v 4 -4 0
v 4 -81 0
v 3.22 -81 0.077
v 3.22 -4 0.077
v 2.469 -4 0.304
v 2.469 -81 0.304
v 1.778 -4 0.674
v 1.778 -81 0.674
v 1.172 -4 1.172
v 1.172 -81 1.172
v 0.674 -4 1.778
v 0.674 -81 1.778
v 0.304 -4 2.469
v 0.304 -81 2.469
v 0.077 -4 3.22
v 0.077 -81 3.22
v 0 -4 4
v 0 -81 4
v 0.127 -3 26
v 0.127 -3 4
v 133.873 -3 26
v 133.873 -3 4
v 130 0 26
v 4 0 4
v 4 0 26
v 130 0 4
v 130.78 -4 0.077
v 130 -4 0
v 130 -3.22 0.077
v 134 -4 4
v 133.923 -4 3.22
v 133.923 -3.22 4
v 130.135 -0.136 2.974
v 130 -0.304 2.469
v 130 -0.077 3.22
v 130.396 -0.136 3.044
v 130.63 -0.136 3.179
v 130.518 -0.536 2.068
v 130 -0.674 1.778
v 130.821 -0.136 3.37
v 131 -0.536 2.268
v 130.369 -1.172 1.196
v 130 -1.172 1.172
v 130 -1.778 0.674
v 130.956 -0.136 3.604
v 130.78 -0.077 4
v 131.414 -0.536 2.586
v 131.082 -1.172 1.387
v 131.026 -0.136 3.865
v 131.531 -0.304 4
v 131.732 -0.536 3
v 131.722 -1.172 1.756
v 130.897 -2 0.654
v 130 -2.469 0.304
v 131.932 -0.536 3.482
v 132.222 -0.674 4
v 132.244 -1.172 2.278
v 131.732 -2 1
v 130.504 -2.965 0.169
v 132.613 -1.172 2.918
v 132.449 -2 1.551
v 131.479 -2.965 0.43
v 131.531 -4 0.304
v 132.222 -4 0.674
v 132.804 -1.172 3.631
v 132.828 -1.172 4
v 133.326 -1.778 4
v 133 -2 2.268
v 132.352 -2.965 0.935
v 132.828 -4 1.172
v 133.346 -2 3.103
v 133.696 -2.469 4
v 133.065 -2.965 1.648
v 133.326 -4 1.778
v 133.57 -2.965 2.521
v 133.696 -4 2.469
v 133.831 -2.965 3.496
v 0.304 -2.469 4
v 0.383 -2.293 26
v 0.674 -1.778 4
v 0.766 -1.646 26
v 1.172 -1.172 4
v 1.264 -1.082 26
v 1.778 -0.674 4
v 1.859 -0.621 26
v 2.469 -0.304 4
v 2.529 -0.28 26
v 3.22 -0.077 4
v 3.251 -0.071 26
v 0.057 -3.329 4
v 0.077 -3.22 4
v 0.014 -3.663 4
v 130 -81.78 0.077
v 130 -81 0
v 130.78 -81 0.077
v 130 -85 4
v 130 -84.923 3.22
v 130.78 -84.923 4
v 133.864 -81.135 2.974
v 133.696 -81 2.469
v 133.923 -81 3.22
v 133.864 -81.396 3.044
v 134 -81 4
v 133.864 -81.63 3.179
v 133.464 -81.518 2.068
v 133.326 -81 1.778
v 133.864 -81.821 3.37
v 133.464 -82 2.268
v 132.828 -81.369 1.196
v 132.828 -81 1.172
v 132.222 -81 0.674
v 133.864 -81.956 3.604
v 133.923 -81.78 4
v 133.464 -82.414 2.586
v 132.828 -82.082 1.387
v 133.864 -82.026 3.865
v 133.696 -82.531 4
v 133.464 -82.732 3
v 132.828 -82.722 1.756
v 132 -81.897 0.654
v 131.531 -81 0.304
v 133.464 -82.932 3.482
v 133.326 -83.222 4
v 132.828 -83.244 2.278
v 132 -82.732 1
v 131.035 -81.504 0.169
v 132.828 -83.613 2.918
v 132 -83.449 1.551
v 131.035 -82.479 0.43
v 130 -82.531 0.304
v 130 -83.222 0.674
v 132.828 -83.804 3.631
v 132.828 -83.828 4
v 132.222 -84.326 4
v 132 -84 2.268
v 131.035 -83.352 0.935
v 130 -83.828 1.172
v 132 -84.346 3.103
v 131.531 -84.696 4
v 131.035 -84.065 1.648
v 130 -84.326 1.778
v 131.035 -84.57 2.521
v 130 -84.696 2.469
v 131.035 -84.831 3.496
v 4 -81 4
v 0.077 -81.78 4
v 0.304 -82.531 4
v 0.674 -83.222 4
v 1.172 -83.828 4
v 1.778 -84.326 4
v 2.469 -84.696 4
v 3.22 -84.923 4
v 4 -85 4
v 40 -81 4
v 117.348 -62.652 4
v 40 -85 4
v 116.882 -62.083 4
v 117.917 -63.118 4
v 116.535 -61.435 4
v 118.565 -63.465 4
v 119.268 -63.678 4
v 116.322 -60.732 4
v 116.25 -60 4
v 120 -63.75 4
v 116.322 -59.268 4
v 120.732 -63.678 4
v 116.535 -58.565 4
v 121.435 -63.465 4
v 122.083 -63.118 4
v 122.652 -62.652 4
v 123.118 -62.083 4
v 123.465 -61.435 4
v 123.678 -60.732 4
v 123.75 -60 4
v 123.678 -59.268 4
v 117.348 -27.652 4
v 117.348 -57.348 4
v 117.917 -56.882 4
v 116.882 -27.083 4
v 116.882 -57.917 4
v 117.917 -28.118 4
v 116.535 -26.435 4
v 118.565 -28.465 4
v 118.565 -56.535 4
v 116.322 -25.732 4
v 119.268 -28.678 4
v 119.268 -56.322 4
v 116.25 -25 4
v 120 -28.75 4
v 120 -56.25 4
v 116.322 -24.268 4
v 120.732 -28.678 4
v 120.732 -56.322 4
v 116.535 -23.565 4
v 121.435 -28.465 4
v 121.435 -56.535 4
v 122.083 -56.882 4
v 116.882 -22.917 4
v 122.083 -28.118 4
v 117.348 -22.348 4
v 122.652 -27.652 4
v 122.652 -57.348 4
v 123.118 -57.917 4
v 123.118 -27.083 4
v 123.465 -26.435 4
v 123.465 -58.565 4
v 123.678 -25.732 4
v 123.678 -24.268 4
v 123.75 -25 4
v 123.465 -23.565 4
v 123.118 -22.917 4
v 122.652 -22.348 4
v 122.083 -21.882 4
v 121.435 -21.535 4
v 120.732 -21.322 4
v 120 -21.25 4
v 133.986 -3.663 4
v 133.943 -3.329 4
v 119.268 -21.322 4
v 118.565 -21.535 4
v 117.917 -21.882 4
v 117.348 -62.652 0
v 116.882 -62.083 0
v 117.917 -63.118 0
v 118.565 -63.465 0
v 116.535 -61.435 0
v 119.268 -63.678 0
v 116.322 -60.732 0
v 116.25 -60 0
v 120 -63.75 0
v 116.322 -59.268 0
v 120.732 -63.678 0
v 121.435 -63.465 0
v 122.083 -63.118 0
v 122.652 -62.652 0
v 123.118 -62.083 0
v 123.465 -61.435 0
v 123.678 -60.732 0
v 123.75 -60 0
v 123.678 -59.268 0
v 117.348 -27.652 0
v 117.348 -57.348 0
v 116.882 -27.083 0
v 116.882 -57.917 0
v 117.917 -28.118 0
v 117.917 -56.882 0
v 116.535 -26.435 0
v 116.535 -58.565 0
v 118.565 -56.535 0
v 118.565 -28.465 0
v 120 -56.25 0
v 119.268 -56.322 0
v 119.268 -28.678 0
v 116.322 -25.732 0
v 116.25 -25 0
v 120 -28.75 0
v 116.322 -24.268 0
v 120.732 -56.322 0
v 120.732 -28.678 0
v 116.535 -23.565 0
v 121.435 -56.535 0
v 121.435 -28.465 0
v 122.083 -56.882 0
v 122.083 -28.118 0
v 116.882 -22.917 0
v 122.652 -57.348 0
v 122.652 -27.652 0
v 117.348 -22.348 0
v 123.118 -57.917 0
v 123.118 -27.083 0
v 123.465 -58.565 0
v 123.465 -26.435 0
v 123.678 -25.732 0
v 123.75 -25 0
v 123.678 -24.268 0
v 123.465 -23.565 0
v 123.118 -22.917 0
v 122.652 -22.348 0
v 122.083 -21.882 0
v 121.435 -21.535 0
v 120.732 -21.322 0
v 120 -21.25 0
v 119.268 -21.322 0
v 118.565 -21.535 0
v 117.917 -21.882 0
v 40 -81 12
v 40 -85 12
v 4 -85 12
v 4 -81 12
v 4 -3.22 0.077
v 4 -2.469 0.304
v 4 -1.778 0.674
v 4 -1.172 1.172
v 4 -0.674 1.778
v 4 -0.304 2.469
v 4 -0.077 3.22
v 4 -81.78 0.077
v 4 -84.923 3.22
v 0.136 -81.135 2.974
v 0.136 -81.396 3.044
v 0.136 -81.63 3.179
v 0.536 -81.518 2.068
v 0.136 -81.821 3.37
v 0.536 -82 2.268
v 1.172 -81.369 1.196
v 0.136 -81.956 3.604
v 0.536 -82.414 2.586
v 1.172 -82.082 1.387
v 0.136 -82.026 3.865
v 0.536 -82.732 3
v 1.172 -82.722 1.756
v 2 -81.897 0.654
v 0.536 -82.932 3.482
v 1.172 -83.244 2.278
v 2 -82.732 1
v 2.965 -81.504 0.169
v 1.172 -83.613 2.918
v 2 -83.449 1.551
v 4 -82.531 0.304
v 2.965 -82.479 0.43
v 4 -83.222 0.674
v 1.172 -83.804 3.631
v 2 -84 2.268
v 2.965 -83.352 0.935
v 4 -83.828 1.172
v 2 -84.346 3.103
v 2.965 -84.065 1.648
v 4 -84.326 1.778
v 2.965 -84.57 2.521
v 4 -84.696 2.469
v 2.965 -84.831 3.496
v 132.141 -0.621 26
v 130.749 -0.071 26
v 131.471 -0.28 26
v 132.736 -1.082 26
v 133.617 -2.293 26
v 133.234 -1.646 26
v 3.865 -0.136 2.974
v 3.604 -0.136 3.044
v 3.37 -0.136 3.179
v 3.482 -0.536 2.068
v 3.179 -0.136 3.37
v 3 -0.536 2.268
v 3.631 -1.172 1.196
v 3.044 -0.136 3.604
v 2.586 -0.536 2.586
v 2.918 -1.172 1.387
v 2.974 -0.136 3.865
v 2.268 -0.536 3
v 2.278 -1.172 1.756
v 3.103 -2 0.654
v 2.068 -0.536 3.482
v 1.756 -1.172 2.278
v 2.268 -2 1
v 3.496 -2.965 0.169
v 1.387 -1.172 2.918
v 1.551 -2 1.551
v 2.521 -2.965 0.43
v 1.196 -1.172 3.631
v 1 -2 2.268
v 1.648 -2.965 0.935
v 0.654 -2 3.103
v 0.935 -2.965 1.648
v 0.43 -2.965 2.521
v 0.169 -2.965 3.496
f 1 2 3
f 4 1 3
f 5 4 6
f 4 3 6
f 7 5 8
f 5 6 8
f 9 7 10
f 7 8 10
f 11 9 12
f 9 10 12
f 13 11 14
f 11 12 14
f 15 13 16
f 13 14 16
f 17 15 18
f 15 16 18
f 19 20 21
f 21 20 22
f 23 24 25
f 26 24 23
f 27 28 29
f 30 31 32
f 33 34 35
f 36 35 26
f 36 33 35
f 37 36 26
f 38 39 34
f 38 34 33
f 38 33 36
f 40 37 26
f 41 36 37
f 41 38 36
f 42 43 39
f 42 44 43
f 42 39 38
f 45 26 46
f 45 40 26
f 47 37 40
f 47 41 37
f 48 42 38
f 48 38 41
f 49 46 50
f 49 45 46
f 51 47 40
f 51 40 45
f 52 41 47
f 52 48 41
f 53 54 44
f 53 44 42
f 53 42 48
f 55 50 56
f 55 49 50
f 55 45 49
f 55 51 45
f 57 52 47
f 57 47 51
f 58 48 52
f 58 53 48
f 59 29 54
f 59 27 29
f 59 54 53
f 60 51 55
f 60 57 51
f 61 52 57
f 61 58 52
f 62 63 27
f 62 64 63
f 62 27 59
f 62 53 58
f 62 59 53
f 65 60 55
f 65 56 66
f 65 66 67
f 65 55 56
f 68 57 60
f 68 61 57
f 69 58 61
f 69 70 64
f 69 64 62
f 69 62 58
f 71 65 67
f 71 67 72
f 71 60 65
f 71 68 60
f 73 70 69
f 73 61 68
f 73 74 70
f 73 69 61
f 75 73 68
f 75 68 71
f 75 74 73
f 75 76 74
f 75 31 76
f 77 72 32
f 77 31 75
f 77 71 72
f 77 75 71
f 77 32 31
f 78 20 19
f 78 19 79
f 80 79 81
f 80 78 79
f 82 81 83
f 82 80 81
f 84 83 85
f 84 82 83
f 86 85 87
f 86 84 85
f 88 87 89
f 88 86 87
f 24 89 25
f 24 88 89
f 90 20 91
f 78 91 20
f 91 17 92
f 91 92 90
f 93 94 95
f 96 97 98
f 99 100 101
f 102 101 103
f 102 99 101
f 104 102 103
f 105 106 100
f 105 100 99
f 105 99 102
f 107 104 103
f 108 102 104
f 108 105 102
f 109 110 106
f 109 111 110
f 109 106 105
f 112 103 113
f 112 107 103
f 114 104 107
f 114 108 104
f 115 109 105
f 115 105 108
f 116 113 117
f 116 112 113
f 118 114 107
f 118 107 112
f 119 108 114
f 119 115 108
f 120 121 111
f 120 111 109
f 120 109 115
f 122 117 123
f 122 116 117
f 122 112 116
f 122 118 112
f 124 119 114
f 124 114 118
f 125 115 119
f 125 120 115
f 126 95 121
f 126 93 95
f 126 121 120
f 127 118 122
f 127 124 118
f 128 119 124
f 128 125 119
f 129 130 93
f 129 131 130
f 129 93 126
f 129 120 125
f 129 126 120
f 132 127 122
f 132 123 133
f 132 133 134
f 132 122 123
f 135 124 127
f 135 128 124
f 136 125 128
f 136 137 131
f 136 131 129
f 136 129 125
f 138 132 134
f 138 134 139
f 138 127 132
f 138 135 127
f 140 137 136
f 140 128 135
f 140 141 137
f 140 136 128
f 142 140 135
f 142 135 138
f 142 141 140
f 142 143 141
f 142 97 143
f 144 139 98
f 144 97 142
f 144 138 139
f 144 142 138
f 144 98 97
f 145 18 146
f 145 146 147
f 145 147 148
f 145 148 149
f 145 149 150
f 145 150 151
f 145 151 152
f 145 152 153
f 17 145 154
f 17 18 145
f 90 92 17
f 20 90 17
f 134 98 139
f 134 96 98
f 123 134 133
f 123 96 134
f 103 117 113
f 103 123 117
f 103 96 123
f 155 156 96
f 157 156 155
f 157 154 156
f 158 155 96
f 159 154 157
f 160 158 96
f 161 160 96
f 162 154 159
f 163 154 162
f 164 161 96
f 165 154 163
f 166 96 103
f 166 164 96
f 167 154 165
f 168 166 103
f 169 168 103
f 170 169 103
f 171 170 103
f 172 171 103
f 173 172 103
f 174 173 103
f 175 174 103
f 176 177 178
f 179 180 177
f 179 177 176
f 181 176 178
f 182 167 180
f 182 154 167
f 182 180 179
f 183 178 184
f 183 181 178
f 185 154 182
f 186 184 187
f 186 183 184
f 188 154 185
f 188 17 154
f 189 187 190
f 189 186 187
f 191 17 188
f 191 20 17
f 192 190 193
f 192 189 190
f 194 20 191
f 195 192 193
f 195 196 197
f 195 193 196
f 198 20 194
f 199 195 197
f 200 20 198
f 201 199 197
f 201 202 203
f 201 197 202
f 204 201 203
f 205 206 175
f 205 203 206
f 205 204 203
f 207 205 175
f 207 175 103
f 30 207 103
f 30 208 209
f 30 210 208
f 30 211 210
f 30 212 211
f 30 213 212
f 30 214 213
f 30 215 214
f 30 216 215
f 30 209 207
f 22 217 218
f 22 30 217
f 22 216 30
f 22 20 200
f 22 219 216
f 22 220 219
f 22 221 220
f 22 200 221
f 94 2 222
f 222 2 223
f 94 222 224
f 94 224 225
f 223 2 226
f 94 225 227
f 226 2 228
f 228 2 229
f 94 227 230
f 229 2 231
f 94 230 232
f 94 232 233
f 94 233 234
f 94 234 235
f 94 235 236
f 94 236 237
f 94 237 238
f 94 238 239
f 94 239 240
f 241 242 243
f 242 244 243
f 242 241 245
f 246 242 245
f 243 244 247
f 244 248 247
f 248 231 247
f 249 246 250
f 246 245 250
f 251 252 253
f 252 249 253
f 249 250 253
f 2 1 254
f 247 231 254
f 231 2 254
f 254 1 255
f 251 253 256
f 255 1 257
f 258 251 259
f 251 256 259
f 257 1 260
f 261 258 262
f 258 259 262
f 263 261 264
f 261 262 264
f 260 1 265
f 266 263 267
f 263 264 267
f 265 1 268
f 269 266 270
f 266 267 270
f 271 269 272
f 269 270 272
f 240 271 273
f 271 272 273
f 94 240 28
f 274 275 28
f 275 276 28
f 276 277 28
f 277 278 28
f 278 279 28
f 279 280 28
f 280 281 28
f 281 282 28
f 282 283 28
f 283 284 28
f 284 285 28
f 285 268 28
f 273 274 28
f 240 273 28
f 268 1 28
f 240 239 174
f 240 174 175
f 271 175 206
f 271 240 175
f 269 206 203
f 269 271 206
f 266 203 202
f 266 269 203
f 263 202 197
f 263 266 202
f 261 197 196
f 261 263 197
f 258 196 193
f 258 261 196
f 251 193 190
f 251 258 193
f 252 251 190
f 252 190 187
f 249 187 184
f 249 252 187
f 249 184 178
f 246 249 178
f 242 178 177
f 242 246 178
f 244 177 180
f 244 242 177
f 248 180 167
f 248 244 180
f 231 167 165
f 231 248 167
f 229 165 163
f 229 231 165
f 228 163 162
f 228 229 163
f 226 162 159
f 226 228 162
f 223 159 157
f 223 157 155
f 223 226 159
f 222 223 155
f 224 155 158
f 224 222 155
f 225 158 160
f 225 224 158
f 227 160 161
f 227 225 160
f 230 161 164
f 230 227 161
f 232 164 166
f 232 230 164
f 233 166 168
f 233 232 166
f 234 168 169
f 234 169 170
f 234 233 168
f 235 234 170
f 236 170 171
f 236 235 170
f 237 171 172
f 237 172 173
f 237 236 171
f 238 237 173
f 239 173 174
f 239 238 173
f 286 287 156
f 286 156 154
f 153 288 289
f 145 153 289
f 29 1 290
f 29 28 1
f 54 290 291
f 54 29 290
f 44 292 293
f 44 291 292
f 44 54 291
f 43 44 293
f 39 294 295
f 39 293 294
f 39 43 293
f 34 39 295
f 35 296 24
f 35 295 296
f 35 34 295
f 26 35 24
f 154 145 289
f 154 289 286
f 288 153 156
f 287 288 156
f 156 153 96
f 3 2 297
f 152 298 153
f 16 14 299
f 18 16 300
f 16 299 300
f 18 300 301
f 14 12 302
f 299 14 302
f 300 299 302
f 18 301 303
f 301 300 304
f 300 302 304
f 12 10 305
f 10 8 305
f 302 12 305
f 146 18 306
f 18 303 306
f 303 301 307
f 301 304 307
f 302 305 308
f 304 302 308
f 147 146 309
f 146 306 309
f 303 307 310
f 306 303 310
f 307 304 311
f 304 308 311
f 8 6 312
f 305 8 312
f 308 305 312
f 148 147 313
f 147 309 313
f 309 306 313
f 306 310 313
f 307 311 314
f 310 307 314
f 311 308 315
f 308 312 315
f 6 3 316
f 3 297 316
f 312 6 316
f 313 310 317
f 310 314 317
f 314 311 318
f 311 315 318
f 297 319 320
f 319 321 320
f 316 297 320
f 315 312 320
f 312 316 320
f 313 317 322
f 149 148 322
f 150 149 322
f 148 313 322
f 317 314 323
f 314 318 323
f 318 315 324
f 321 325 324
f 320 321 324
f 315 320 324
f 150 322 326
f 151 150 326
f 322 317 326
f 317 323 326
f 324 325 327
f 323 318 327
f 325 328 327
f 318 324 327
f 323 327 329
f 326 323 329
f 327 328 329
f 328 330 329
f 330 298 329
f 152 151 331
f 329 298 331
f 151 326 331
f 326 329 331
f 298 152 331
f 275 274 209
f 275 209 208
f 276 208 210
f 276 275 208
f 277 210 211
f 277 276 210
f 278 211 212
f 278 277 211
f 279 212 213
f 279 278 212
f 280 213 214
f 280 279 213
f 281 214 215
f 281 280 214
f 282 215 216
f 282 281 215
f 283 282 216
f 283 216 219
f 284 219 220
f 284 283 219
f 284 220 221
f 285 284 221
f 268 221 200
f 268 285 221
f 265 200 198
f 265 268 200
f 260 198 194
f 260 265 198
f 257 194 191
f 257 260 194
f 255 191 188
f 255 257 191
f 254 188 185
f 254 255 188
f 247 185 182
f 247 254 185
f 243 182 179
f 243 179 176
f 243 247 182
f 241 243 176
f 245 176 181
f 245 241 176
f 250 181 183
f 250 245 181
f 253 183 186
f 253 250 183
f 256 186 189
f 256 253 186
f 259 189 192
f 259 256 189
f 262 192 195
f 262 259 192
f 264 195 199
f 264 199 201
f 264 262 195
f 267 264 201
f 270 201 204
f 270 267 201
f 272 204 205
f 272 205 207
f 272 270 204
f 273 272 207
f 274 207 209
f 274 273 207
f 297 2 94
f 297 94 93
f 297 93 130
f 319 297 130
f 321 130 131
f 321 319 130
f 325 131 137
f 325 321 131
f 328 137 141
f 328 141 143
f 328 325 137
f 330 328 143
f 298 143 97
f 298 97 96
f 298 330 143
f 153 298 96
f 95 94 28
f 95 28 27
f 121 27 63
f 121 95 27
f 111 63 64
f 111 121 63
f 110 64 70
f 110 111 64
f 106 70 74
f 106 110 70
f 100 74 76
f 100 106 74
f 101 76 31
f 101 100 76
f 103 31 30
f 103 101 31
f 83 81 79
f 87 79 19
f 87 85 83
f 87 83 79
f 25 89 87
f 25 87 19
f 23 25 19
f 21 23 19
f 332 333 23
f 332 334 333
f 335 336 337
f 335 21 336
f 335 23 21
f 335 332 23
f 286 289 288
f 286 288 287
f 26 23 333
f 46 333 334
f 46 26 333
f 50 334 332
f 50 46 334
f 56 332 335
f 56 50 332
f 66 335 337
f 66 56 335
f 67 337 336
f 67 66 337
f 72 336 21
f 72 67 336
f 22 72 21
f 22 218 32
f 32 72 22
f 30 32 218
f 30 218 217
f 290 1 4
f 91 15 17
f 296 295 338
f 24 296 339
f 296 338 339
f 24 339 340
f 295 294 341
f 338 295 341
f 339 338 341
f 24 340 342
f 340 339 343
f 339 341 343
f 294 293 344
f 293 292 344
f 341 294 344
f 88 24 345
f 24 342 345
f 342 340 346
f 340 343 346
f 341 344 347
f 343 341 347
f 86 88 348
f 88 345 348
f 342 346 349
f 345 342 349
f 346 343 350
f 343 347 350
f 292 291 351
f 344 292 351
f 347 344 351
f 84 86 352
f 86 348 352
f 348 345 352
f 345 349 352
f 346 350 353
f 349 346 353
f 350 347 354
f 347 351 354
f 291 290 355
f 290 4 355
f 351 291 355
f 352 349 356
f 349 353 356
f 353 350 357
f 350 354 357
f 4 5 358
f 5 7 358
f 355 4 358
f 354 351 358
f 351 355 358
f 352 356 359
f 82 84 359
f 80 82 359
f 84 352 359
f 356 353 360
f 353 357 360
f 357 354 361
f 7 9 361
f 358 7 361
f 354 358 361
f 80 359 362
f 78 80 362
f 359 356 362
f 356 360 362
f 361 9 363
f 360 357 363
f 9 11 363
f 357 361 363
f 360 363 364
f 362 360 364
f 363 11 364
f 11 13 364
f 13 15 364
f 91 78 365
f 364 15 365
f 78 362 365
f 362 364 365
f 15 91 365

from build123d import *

# Parameters (mm, degrees)
F0_W     = 134
F0_H     = 3
F0_W_2   = 36
F0_H_2   = 4
F0_R     = 3.75
F1_DEPTH = 4
F2_DEPTH = 26
F3_DEPTH = 12
F4_R     = 3.99999


# Not quite as in the source:
# - a fillet or chamfer is up to 0.001 mm smaller than in the source, because OpenCascade refuses the exact size


with BuildPart() as f1:
    # F0 (on Top) → F1 (new body)
    with BuildSketch(Plane.XY):
        with Locations((67, -1.5)):
            Rectangle(F0_W, F0_H)
        with Locations((22, -83)):
            Rectangle(F0_W_2, F0_H_2)
        Polygon((134, -3), (0, -3), (0, -85), (4, -85), (4, -81), (40, -81), (40, -85), (134, -85), align=None)
        with Locations((120, -60)):
            Circle(F0_R, mode=Mode.SUBTRACT)
        with Locations((120, -25)):
            Circle(F0_R, mode=Mode.SUBTRACT)
    extrude(amount=F1_DEPTH)

    # F0 (on Top) → F2 (join)
    with BuildSketch(Plane.XY):
        with Locations((67, -1.5)):
            Rectangle(F0_W, F0_H)
    extrude(amount=F2_DEPTH)

    # F0 (on Top) → F3 (join)
    with BuildSketch(Plane.XY):
        with Locations((22, -83)):
            Rectangle(F0_W_2, F0_H_2)
    extrude(amount=F3_DEPTH)

    # F4 (radius 4 in the source; OpenCascade refuses exactly that, so slightly less here)
    f4_edges = [f1.edges().sort_by_distance(p)[0] for p in [
        (67, -85, 0),
        (134, -42.5, 0),
        (0, -42.5, 0),
        (67, 0, 0),
        (134, 0, 13),
        (0, 0, 13),
        (134, -85, 2),
        (0, -85, 2),
    ]]
    fillet(f4_edges, radius=F4_R)


solid = f1.part
